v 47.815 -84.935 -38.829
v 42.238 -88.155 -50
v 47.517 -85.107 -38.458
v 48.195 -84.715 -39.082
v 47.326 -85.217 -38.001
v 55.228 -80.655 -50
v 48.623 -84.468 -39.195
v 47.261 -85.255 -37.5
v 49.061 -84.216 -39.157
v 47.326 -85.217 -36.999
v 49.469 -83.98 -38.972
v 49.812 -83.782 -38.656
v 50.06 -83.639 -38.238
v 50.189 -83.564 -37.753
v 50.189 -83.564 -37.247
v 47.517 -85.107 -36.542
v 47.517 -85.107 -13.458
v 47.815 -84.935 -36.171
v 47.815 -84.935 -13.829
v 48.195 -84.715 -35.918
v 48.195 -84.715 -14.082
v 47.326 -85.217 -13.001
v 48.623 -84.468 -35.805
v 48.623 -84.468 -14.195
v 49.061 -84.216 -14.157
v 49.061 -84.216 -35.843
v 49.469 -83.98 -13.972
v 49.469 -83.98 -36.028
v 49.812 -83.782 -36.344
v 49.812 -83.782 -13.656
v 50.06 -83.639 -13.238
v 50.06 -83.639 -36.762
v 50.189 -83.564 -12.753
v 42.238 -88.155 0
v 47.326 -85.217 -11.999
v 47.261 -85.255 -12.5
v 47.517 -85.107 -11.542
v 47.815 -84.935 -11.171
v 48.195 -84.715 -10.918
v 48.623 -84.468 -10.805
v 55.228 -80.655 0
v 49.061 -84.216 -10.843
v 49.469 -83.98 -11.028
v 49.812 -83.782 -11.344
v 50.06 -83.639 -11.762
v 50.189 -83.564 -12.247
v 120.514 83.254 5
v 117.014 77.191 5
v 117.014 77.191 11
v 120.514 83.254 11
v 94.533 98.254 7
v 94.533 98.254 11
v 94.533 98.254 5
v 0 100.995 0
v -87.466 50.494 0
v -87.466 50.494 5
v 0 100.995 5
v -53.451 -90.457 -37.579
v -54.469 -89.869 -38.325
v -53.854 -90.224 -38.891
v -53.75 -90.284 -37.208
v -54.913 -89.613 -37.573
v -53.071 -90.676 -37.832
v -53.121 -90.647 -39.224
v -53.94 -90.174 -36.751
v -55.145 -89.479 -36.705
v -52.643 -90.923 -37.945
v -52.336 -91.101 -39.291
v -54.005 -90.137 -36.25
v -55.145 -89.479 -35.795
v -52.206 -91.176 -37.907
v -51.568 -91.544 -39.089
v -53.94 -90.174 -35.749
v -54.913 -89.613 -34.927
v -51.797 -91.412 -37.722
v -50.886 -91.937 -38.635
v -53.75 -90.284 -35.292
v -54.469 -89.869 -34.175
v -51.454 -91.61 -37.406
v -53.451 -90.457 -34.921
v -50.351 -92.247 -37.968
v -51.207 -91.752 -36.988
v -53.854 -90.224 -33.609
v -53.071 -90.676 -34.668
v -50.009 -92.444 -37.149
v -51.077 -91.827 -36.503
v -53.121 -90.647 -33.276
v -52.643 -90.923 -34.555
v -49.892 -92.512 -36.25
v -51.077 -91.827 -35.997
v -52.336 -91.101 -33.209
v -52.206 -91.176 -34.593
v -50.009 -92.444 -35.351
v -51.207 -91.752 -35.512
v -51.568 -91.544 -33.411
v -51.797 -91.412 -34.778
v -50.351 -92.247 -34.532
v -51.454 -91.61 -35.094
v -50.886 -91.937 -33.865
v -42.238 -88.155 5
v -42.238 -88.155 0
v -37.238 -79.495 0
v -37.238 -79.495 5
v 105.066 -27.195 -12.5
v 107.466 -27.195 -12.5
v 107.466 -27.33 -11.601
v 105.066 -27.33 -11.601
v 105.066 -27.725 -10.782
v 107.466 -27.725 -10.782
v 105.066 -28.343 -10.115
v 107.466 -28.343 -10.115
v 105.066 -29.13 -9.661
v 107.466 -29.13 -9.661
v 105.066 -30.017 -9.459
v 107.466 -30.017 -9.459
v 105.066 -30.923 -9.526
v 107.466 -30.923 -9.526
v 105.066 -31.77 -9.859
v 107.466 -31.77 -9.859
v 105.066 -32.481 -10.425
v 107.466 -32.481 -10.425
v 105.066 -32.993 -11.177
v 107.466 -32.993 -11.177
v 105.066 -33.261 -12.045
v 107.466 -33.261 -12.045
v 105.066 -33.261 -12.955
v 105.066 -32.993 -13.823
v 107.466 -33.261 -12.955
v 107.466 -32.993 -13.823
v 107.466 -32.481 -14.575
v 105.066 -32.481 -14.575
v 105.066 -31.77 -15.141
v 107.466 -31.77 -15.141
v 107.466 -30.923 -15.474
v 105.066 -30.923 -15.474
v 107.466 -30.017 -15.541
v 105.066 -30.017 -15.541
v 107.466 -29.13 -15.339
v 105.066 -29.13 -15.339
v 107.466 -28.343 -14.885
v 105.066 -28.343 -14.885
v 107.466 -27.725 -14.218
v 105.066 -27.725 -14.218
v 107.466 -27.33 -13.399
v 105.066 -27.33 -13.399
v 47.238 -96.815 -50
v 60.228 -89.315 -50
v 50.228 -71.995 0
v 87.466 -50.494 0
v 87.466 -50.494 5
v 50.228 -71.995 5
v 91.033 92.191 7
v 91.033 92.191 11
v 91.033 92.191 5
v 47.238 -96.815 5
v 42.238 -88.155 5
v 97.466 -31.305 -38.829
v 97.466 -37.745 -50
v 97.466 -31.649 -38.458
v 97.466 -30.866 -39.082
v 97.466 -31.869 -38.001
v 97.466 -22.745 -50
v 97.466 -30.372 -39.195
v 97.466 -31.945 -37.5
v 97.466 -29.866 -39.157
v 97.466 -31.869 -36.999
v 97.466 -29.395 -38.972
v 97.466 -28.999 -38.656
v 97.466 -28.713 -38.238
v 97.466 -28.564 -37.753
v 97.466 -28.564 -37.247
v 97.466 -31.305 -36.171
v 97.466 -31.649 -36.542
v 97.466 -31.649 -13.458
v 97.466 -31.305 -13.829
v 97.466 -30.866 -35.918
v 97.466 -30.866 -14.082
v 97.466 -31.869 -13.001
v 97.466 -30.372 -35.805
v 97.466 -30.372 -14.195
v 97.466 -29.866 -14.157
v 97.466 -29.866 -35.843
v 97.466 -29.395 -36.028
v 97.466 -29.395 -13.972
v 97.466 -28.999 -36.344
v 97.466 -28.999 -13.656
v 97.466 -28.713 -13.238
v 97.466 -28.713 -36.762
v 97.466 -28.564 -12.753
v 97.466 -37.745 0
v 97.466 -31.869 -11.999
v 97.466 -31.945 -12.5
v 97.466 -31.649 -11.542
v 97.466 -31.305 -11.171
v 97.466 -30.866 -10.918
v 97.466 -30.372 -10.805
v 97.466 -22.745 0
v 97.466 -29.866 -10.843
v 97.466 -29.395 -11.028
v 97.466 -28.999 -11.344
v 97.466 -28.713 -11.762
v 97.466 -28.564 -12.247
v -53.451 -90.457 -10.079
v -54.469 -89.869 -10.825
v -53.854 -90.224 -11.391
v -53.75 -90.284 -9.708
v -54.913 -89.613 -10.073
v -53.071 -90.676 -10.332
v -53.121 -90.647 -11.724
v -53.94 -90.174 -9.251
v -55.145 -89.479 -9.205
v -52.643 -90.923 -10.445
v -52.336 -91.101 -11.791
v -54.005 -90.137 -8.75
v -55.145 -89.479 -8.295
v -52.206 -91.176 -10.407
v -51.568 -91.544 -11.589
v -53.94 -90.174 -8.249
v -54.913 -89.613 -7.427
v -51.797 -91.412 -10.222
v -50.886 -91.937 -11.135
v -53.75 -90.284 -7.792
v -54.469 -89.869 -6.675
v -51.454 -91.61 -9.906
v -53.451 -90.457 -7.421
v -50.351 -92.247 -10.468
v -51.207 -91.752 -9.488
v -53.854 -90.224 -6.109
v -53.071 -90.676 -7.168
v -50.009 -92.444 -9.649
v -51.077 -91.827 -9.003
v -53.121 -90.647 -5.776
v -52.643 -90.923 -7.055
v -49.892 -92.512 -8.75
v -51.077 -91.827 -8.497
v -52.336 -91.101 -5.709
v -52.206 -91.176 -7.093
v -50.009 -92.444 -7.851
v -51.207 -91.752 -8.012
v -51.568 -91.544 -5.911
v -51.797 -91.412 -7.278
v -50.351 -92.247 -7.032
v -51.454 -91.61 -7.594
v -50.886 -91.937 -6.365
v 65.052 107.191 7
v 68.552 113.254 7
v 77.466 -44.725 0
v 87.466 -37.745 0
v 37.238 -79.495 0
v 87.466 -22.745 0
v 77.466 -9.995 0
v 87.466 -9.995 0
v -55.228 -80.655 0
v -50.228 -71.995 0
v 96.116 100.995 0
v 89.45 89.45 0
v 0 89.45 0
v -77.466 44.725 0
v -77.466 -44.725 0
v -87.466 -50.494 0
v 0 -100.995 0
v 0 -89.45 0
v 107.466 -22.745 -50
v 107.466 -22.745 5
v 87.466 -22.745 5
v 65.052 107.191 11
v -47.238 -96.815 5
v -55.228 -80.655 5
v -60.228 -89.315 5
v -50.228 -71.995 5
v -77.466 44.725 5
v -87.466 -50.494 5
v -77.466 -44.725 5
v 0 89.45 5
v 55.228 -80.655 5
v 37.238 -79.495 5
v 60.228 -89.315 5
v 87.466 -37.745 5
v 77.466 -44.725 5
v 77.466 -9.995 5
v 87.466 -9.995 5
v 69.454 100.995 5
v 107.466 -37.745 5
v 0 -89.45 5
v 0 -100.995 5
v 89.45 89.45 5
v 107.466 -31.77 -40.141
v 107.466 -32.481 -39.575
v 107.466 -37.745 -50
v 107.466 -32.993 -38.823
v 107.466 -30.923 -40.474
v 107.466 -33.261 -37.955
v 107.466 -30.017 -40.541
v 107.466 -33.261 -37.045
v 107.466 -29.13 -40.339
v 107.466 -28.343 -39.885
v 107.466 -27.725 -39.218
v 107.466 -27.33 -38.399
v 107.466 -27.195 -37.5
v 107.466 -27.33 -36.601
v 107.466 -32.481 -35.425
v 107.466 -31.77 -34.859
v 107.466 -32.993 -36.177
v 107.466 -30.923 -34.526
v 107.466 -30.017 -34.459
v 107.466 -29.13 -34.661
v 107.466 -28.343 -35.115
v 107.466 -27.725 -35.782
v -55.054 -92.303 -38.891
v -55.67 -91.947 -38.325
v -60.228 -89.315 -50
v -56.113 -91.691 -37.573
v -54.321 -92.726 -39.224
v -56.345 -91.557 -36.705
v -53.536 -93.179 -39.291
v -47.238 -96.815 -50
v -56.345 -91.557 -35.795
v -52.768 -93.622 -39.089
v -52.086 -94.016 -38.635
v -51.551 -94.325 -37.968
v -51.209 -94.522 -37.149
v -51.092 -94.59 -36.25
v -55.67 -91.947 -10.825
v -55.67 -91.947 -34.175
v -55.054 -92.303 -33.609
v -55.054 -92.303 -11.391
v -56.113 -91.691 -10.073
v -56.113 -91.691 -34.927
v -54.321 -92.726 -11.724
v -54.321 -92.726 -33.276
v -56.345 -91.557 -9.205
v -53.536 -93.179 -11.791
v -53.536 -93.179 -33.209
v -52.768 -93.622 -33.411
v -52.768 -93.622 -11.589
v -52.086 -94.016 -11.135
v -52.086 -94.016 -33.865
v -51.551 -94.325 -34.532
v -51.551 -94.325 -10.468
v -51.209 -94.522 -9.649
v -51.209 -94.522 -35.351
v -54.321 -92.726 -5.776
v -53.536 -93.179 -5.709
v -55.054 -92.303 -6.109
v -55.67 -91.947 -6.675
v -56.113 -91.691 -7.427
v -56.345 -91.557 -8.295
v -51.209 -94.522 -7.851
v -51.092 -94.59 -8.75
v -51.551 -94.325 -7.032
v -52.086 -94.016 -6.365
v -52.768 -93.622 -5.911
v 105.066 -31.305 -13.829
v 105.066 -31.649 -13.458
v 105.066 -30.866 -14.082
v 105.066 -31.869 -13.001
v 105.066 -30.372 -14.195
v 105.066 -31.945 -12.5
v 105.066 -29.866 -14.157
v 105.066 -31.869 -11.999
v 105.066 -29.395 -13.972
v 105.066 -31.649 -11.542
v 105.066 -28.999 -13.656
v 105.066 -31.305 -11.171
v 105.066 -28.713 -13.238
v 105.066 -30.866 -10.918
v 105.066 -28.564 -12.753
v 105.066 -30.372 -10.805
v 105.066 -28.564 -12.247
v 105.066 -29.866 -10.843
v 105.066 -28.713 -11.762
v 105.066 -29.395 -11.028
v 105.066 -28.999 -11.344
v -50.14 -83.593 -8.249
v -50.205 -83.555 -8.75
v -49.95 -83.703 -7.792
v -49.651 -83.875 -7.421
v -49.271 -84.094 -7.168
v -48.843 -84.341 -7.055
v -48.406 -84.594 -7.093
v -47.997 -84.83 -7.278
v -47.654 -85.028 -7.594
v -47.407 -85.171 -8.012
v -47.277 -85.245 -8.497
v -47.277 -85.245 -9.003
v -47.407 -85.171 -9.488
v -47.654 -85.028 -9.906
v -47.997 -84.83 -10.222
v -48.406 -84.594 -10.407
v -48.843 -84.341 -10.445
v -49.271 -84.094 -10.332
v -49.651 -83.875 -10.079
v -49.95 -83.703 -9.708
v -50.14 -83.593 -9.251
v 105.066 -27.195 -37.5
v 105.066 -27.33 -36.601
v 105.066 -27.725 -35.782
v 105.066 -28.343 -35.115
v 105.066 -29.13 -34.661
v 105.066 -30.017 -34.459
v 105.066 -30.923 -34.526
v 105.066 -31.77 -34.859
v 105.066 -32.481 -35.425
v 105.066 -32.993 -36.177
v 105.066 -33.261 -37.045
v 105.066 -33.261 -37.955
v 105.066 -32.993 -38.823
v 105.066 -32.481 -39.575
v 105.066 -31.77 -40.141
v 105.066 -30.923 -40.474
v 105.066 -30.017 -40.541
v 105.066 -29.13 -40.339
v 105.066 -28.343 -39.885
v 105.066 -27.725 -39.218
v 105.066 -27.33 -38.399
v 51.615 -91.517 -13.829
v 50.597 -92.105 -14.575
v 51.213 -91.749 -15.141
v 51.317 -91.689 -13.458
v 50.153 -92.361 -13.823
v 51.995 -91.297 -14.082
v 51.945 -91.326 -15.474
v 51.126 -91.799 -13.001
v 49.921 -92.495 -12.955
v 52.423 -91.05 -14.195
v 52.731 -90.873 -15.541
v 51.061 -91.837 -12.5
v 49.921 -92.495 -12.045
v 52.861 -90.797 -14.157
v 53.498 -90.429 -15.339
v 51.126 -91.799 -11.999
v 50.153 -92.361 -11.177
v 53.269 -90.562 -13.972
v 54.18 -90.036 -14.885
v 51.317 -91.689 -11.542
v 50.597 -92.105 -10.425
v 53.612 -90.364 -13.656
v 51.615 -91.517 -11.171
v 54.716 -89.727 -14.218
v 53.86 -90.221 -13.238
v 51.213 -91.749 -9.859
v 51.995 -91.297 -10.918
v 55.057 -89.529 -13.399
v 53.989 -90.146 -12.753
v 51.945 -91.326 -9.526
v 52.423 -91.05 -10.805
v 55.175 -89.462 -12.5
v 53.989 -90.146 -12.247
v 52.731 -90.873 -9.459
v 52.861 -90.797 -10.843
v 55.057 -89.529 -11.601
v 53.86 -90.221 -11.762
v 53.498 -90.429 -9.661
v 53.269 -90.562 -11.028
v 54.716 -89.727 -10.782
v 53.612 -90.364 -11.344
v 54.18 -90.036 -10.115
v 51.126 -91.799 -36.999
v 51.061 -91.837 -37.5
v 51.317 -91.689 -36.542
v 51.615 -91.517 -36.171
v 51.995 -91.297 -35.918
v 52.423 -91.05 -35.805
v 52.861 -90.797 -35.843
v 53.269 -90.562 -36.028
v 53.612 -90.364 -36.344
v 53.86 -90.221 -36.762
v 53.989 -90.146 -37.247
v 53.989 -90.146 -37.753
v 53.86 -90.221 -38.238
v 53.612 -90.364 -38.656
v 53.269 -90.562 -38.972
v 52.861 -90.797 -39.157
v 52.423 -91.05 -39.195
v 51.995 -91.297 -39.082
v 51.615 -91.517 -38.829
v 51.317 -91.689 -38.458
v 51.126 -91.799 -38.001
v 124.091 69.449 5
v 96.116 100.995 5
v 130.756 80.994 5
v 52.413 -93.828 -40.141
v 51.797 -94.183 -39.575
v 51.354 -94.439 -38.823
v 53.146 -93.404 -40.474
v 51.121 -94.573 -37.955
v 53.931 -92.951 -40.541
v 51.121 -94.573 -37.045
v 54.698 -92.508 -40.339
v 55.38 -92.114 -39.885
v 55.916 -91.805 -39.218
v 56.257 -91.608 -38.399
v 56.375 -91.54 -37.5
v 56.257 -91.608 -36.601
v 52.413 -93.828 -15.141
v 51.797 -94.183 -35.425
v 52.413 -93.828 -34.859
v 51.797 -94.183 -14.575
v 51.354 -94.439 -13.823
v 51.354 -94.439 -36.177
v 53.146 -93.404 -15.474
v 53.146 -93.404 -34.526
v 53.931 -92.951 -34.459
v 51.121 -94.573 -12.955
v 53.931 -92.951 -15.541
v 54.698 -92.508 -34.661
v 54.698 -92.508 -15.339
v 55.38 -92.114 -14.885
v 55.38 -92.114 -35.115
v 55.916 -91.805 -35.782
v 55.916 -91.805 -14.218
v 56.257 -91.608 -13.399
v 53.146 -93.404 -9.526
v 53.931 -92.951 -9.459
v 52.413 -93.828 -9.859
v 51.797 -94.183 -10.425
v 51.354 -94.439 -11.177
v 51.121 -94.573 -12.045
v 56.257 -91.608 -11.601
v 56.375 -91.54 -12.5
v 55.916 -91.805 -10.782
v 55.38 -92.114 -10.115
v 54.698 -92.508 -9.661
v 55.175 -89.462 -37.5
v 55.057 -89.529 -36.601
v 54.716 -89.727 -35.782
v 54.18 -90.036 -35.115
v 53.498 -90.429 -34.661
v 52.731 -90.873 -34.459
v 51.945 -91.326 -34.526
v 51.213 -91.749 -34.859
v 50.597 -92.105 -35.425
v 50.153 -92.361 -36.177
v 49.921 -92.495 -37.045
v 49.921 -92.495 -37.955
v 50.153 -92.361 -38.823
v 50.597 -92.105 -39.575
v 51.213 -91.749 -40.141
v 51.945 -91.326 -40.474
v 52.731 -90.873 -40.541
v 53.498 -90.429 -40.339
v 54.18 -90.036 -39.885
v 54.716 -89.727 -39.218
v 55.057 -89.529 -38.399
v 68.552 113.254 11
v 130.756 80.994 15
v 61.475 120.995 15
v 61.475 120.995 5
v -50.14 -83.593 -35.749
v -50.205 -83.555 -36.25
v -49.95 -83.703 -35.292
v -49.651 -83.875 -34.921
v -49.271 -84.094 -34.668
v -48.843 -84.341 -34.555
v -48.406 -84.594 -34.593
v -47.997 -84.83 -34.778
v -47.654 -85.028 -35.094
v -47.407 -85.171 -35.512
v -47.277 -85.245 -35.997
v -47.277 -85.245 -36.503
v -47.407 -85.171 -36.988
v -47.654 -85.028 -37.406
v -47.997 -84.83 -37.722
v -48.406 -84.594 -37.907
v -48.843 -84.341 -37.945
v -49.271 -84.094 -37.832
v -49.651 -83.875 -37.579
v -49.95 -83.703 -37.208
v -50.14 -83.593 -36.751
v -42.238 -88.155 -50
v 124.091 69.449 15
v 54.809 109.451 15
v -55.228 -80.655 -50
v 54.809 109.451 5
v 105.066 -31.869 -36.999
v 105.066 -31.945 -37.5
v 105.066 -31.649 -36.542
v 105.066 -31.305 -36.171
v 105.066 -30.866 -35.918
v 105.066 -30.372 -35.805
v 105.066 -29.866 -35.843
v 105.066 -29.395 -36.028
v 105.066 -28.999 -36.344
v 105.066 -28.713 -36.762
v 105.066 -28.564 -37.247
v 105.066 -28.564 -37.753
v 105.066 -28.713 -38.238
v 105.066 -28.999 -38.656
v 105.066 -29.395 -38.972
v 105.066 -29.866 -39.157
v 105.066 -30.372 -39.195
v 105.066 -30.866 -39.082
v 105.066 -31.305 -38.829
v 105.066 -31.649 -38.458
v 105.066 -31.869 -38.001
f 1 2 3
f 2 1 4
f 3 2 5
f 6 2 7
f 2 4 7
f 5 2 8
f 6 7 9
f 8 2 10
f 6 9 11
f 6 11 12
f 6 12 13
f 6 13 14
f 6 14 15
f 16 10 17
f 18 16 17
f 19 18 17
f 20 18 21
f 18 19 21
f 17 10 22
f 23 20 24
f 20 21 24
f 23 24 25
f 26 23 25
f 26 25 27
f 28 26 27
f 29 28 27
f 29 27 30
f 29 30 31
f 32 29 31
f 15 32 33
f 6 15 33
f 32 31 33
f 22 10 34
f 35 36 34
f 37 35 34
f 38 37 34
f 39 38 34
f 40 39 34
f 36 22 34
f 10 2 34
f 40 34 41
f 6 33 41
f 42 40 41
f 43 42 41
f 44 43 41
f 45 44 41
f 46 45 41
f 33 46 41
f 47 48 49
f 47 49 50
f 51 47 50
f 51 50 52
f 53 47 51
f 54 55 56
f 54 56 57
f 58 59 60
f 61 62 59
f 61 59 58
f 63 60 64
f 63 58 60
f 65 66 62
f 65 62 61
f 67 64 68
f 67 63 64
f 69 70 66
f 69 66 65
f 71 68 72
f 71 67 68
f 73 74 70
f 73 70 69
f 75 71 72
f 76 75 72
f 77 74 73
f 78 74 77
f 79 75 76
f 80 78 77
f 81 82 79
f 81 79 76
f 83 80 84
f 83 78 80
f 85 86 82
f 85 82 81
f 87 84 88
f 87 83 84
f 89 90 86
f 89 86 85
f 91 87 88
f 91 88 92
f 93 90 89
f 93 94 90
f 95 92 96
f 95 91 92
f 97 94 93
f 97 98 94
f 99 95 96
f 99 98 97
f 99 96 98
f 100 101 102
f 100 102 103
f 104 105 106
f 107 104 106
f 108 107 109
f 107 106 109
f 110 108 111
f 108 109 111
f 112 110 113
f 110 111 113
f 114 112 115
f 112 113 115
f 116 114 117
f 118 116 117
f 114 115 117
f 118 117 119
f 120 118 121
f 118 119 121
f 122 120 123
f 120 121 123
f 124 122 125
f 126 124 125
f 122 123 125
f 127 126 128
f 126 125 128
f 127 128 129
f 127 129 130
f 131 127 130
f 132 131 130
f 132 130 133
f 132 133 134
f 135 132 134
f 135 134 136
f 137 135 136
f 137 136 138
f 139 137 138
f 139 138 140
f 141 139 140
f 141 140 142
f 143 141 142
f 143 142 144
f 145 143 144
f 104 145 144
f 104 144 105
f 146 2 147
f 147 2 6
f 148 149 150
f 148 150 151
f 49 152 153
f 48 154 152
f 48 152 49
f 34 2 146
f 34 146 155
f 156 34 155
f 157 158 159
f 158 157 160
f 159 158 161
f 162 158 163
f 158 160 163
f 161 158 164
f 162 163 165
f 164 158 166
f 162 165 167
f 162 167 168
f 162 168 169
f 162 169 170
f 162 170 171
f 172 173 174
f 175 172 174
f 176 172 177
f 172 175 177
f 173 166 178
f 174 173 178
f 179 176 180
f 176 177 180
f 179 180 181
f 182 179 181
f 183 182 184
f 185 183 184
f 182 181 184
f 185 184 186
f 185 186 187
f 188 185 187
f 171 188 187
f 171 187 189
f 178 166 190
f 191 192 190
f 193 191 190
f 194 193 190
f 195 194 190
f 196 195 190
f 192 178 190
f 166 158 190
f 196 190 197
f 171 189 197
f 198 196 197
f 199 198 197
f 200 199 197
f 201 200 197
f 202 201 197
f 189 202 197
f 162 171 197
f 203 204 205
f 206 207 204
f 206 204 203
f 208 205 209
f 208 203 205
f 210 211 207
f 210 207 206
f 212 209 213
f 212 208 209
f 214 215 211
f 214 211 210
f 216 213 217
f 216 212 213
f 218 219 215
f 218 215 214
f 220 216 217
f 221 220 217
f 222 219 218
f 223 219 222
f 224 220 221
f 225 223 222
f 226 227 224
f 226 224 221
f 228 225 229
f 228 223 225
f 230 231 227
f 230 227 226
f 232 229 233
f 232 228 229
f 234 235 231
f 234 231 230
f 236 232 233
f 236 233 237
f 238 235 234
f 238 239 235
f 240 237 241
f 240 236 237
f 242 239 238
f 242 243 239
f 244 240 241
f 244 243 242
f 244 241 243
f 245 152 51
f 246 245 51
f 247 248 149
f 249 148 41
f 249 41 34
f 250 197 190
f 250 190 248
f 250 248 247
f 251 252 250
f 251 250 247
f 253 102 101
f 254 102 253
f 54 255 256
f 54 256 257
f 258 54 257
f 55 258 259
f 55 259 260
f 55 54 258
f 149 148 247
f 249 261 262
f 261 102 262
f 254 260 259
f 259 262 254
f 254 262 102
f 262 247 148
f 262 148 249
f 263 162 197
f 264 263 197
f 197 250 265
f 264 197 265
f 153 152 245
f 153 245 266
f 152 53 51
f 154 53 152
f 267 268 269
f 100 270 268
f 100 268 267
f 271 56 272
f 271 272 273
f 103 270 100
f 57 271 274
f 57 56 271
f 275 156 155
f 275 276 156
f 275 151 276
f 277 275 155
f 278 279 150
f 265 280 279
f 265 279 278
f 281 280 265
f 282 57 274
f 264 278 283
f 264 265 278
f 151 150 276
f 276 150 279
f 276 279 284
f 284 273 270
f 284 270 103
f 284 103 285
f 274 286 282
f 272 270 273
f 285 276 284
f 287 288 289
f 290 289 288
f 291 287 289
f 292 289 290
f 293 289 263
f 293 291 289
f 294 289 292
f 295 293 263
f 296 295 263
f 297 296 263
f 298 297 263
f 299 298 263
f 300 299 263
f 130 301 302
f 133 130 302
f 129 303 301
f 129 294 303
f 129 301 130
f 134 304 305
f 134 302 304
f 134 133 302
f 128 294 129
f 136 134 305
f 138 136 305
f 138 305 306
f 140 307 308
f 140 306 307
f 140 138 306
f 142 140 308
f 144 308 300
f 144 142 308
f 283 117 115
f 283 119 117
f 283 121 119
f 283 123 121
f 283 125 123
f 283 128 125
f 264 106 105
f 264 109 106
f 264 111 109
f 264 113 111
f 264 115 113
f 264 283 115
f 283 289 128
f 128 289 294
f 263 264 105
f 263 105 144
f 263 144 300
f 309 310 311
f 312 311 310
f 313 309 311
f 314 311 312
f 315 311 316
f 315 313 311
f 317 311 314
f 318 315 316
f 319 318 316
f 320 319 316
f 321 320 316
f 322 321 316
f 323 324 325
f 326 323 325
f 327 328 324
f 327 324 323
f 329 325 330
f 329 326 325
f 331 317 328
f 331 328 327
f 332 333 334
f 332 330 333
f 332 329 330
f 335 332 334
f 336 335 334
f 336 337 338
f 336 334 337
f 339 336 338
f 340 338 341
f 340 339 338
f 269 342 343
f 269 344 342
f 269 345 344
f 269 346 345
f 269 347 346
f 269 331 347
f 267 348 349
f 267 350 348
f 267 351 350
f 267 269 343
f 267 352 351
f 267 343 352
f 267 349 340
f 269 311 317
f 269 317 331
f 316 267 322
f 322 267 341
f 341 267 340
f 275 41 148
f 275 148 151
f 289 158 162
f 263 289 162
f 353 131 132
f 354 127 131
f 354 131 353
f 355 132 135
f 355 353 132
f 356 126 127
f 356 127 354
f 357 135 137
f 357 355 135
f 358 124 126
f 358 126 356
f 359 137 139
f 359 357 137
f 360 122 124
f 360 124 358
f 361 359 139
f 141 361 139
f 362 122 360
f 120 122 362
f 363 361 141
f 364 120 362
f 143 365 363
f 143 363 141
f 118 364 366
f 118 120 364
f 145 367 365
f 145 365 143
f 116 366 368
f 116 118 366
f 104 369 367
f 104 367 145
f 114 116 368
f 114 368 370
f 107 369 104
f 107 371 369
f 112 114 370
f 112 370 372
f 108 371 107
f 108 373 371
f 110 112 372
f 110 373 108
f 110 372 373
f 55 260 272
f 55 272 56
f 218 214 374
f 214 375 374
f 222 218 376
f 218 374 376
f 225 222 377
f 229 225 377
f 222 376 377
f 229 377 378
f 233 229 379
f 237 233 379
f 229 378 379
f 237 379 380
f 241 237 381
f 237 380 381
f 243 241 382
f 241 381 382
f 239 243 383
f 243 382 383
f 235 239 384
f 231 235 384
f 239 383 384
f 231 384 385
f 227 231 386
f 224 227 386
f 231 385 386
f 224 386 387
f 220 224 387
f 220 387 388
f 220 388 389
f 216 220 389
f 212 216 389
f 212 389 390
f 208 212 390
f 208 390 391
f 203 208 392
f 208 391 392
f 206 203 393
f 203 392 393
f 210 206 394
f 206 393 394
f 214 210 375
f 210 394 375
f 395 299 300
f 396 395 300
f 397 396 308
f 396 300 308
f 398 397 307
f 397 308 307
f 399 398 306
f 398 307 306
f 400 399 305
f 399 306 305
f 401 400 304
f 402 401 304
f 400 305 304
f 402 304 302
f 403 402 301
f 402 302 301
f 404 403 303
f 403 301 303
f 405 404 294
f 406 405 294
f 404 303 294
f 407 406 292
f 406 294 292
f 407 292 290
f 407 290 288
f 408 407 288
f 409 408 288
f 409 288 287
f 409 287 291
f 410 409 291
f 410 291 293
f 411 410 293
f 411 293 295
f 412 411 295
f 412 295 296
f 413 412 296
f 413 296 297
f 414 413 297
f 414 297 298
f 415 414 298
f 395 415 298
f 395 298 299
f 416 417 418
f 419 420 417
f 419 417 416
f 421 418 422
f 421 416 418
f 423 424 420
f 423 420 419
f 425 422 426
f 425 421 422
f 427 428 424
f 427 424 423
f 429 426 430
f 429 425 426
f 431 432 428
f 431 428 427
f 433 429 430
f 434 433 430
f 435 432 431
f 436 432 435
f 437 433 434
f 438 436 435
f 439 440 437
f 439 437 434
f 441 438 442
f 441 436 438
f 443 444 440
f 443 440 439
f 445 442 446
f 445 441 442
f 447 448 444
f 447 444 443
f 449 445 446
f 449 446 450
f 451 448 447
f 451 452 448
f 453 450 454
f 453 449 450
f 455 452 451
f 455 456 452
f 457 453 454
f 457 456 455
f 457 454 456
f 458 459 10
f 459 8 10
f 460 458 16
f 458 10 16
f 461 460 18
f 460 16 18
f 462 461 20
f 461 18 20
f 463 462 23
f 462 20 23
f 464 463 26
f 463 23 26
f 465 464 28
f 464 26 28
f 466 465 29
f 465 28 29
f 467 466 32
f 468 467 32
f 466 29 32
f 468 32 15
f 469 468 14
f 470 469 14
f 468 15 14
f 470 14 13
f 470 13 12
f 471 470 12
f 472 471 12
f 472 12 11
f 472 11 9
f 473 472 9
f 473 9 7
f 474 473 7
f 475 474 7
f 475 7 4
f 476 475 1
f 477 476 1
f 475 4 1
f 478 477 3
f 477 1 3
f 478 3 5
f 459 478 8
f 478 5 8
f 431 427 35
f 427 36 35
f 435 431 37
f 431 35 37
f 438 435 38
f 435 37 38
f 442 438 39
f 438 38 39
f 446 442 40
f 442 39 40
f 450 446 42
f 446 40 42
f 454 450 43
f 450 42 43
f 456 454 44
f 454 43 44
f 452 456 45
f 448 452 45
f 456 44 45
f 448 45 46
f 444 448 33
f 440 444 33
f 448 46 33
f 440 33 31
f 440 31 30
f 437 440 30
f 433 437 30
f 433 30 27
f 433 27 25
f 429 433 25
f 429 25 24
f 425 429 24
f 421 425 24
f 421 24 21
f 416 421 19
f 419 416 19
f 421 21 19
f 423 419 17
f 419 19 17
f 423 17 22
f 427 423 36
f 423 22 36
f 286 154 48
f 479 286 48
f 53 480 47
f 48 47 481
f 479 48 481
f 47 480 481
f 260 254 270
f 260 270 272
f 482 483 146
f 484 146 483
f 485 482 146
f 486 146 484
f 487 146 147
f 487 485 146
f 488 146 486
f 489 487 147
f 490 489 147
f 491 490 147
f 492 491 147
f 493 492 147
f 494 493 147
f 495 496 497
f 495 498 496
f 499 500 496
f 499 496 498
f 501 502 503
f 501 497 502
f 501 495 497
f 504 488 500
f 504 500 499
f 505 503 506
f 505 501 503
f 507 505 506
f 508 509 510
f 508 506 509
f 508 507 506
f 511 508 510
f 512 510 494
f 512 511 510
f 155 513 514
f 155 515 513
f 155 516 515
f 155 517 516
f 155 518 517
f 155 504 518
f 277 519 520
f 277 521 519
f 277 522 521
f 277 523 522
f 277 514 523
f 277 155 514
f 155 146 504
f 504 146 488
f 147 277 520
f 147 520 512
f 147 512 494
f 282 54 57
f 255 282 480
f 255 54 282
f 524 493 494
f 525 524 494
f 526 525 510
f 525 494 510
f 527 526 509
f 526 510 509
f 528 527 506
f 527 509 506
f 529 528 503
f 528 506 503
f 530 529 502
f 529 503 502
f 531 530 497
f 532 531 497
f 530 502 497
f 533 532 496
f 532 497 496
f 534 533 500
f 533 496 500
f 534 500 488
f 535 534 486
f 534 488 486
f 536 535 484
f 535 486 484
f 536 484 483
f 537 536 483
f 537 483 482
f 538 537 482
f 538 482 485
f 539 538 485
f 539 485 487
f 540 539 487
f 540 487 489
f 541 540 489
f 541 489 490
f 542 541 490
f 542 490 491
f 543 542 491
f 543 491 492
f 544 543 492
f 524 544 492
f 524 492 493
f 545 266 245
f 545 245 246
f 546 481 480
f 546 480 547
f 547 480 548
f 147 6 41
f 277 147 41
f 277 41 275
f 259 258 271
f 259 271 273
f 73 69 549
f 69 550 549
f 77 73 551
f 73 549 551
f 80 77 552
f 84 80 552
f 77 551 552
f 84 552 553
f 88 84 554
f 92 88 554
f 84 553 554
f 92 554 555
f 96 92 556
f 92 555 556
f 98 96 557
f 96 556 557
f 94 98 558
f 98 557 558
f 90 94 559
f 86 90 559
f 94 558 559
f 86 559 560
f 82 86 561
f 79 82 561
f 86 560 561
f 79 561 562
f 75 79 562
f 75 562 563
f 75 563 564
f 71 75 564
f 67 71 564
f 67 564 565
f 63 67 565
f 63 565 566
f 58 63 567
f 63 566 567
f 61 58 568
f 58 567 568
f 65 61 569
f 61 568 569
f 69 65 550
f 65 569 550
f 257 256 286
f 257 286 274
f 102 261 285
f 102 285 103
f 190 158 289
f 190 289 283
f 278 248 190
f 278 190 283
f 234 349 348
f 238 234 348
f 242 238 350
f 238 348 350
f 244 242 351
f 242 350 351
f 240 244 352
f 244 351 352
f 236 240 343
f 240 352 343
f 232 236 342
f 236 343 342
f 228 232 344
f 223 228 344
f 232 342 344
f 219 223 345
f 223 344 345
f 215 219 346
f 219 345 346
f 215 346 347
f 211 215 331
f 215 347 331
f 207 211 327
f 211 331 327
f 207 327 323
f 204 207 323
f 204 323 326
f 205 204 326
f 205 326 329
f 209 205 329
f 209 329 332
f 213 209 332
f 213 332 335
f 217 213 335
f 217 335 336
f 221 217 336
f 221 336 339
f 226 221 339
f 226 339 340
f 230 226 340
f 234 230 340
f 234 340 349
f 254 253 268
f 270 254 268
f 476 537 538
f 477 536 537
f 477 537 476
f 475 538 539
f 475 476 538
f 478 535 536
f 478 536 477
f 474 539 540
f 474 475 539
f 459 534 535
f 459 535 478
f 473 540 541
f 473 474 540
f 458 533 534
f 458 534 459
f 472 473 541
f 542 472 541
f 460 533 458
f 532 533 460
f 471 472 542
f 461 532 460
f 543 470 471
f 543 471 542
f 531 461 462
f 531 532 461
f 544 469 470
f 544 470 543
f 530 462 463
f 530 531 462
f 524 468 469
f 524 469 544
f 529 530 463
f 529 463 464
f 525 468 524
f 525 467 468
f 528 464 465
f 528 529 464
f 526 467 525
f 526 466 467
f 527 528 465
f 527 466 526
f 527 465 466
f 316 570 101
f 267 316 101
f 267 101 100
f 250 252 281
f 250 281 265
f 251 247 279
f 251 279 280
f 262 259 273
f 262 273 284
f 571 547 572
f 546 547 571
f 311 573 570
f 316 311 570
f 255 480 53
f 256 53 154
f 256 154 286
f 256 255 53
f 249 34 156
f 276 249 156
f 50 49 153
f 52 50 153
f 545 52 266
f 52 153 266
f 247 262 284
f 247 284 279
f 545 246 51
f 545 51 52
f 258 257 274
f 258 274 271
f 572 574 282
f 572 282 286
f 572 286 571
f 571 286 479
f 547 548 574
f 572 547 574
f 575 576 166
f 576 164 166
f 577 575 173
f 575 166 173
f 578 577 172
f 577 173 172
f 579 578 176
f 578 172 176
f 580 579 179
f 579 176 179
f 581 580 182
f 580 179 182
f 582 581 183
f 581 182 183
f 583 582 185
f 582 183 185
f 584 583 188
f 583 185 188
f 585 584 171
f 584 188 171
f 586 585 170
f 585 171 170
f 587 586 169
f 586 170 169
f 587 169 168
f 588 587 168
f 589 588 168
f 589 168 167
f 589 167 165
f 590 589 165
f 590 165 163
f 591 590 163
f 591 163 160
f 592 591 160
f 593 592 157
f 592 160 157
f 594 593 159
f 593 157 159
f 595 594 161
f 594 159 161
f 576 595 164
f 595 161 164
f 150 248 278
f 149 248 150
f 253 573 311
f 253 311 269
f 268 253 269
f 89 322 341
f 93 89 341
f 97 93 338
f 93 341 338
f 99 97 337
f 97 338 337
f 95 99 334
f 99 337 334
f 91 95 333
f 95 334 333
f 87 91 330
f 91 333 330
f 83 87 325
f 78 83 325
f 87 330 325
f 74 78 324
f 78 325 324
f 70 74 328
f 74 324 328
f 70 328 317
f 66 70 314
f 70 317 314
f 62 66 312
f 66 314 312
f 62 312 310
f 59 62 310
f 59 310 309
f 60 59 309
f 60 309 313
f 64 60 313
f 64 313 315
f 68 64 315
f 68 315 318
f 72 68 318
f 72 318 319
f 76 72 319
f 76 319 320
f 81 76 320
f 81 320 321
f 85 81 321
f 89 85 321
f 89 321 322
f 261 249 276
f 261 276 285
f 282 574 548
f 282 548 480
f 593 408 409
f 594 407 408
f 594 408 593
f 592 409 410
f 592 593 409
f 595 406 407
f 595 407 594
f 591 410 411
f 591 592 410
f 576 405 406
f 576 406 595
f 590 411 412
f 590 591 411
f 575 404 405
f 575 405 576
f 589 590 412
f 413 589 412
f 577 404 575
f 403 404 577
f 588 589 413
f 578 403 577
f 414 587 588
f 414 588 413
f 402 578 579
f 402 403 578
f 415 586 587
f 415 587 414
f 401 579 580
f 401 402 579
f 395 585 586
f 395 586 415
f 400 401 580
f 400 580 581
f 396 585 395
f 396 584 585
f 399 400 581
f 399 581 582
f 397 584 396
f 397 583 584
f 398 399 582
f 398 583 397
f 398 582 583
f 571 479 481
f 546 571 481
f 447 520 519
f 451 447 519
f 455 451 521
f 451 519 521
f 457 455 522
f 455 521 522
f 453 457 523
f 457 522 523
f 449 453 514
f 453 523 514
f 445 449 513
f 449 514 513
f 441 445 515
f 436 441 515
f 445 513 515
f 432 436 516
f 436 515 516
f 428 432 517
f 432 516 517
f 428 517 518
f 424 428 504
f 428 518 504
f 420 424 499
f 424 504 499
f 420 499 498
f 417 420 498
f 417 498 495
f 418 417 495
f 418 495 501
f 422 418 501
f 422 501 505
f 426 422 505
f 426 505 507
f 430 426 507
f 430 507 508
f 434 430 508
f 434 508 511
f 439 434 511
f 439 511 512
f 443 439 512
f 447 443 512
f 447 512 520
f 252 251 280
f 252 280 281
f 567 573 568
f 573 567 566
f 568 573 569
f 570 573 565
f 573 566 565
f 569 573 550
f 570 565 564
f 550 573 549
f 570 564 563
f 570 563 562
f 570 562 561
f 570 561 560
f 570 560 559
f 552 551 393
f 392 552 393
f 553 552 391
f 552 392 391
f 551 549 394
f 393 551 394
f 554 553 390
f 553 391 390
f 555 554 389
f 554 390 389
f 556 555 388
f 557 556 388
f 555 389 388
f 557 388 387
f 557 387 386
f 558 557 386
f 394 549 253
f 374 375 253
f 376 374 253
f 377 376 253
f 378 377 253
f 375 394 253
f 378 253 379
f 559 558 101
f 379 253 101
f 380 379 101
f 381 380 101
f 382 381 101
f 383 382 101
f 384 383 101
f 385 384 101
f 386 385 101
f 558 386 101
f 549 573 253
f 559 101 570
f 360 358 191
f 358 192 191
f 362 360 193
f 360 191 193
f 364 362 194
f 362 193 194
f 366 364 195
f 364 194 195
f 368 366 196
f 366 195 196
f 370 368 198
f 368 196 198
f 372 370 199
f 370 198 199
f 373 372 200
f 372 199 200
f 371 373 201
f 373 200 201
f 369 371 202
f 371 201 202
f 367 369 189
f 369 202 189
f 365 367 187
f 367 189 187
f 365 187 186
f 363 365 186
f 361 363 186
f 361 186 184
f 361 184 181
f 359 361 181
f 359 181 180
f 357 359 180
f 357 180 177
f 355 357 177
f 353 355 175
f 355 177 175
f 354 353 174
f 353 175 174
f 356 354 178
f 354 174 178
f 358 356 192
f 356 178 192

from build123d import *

# Parameters (mm, degrees)
PAD_DEPTH           = 5
PAD001_DEPTH        = 10
POCKET_DEPTH        = 6
SKETCH003_W         = 7
SKETCH003_H         = 4
POCKET001_DEPTH     = 30
SKETCH004_W         = 15
SKETCH004_H         = 5
PAD002_DEPTH        = 10
SKETCH005_W         = 15
SKETCH005_H         = 55
PAD003_DEPTH        = 10
HOLE_D              = 3.4
HOLE_DEPTH          = 25
HOLE_CBORE_D        = 6.1
HOLE_CBORE_DEPTH    = 2.4
HOLE_TIPS_R         = 1.7
SKETCH007_W         = 15
SKETCH007_H         = 5
PAD004_DEPTH        = 10
SKETCH008_W         = 15
SKETCH008_H         = 55
PAD005_DEPTH        = 10
HOLE001_D           = 3.4
HOLE001_DEPTH       = 25
HOLE001_CBORE_D     = 6.1
HOLE001_CBORE_DEPTH = 2.4
HOLE001_TIPS_R      = 1.7
SKETCH010_W         = 15
SKETCH010_H         = 5
PAD006_DEPTH        = 10
SKETCH011_W         = 15
SKETCH011_H         = 55
PAD007_DEPTH        = 10
HOLE002_D           = 3.4
HOLE002_DEPTH       = 25
HOLE002_CBORE_D     = 6.1
HOLE002_CBORE_DEPTH = 2.4
HOLE002_TIPS_R      = 1.7


with BuildPart() as part:
    # Sketch → Pad (new body)
    with BuildSketch(Plane.XY):
        Polygon((77.465972, -44.725), (77.465972, -9.995), (87.465972, -9.995), (87.465972, -50.494492), (0, -100.995), (-87.465972, -50.494492), (-87.465972, 50.494492), (0, 100.995), (96.115509, 100.995), (89.45, 89.45), (0, 89.45), (-77.465972, 44.725), (-77.465972, -44.725), (0, -89.45), align=None)
    extrude(amount=PAD_DEPTH)

    # Sketch001 (on Face16 of Pad) → Pad001 (join)
    with BuildSketch(Plane.XY.offset(5)):
        Polygon((124.090672, 69.449404), (130.75638, 80.99429), (61.475035, 120.995481), (54.809328, 109.450596), align=None)
    extrude(amount=PAD001_DEPTH)

    # Sketch002 (on Face7 of Pad001) → Pocket (cut)
    with BuildSketch(Plane(origin=(0, 0, 5), x_dir=(1, 0, 0), z_dir=(0, 0, -1))):
        Polygon((91.032754, -92.191411), (117.013517, -77.191411), (120.513517, -83.253589), (94.532754, -98.253589), align=None)
    extrude(amount=-POCKET_DEPTH, mode=Mode.SUBTRACT)

    # Sketch003 (on Face8 of Pocket) → Pocket001 (cut)
    with BuildSketch(Plane(origin=(28.354514, -16.370486, 0), x_dir=(0.5, 0.866025, 0), z_dir=(0.866025, -0.5, 0))):
        with Locations((128.856481, 9)):
            Rectangle(SKETCH003_W, SKETCH003_H)
    extrude(amount=-POCKET001_DEPTH, mode=Mode.SUBTRACT)

    # Sketch004 (on Face14 of Pocket001) → Pad002 (join)
    with BuildSketch(Plane.YZ.offset(87.465972)):
        with Locations((-30.244746, 2.5)):
            Rectangle(SKETCH004_W, SKETCH004_H)
    extrude(amount=PAD002_DEPTH)

    # Sketch005 (on Face32 of Pad002) → Pad003 (join)
    with BuildSketch(Plane.YZ.offset(97.465972)):
        with Locations((-30.244746, -22.5)):
            Rectangle(SKETCH005_W, SKETCH005_H)
    extrude(amount=PAD003_DEPTH)

    # Hole
    with Locations(Plane.YZ.offset(107.465972)):
        with Locations((-30.244746, -12.5), (-30.244746, -37.5)):
            CounterBoreHole(HOLE_D / 2, HOLE_CBORE_D / 2, HOLE_CBORE_DEPTH, depth=HOLE_DEPTH)

    # Hole tips → Hole tip 1 section 0
    with BuildSketch(Plane.YZ.offset(82.465972), mode=Mode.PRIVATE) as hole_tip_1_s0:
        with Locations((-30.244746, -12.5)):
            Circle(HOLE_TIPS_R)
    loft([hole_tip_1_s0.sketch, Vertex(81.444509, -30.244746, -12.5)], mode=Mode.SUBTRACT)

    # Hole tips → Hole tip 2 section 0
    with BuildSketch(Plane.YZ.offset(82.465972), mode=Mode.PRIVATE) as hole_tip_2_s0:
        with Locations((-30.244746, -37.5)):
            Circle(HOLE_TIPS_R)
    loft([hole_tip_2_s0.sketch, Vertex(81.444509, -30.244746, -37.5)], mode=Mode.SUBTRACT)

    # Sketch007 (on Face17 of Hole) → Pad004 (join)
    with BuildSketch(Plane(origin=(43.732986, -75.744746, 0), x_dir=(0.866017, 0.500015, 0), z_dir=(0.500015, -0.866017, 0))):
        with Locations((0, 2.5)):
            Rectangle(SKETCH007_W, SKETCH007_H)
    extrude(amount=PAD004_DEPTH)

    # Sketch008 (on Face38 of Pad004) → Pad005 (join)
    with BuildSketch(Plane(origin=(48.733135, -84.404914, 0), x_dir=(0.866017, 0.500015, 0), z_dir=(0.500015, -0.866017, 0))):
        with Locations((0, -22.5)):
            Rectangle(SKETCH008_W, SKETCH008_H)
    extrude(amount=PAD005_DEPTH)

    # Hole001
    with Locations(Plane(origin=(53.733284, -93.065082, 0), x_dir=(0.866017, 0.500015, 0), z_dir=(0.500015, -0.866017, 0))):
        with Locations((0, -12.5), (0, -37.5)):
            CounterBoreHole(HOLE001_D / 2, HOLE001_CBORE_D / 2, HOLE001_CBORE_DEPTH, depth=HOLE001_DEPTH)

    # Hole001 tips → Hole001 tip 1 section 0
    with BuildSketch(Plane(origin=(41.232912, -71.414662, 0), x_dir=(0.866017, 0.500015, 0), z_dir=(0.500015, -0.866017, 0)), mode=Mode.PRIVATE) as hole001_tip_1_s0:
        with Locations((0, -12.5)):
            Circle(HOLE001_TIPS_R)
    loft([hole001_tip_1_s0.sketch, Vertex(40.722165, -70.530058, -12.5)], mode=Mode.SUBTRACT)

    # Hole001 tips → Hole001 tip 2 section 0
    with BuildSketch(Plane(origin=(41.232912, -71.414662, 0), x_dir=(0.866017, 0.500015, 0), z_dir=(0.500015, -0.866017, 0)), mode=Mode.PRIVATE) as hole001_tip_2_s0:
        with Locations((0, -37.5)):
            Circle(HOLE001_TIPS_R)
    loft([hole001_tip_2_s0.sketch, Vertex(40.722165, -70.530058, -37.5)], mode=Mode.SUBTRACT)

    # Sketch010 (on Face20 of Hole001) → Pad006 (join)
    with BuildSketch(Plane(origin=(-43.732986, -75.744746, 0), x_dir=(0.866017, -0.500015, 0), z_dir=(-0.500015, -0.866017, 0))):
        with Locations((0, 2.5)):
            Rectangle(SKETCH010_W, SKETCH010_H)
    extrude(amount=PAD006_DEPTH)

    # Sketch011 (on Face44 of Pad006) → Pad007 (join)
    with BuildSketch(Plane(origin=(-48.733135, -84.404914, 0), x_dir=(0.866017, -0.500015, 0), z_dir=(-0.500015, -0.866017, 0))):
        with Locations((0, -22.5)):
            Rectangle(SKETCH011_W, SKETCH011_H)
    extrude(amount=PAD007_DEPTH)

    # Hole002
    with Locations(Plane(origin=(-53.733284, -93.065082, 0), x_dir=(0.866017, -0.500015, 0), z_dir=(-0.500015, -0.866017, 0))):
        with Locations((0, -36.25), (0, -8.75)):
            CounterBoreHole(HOLE002_D / 2, HOLE002_CBORE_D / 2, HOLE002_CBORE_DEPTH, depth=HOLE002_DEPTH)

    # Hole002 tips → Hole002 tip 1 section 0
    with BuildSketch(Plane(origin=(-41.232912, -71.414662, 0), x_dir=(0.866017, -0.500015, 0), z_dir=(-0.500015, -0.866017, 0)), mode=Mode.PRIVATE) as hole002_tip_1_s0:
        with Locations((0, -36.25)):
            Circle(HOLE002_TIPS_R)
    loft([hole002_tip_1_s0.sketch, Vertex(-40.722165, -70.530058, -36.25)], mode=Mode.SUBTRACT)

    # Hole002 tips → Hole002 tip 2 section 0
    with BuildSketch(Plane(origin=(-41.232912, -71.414662, 0), x_dir=(0.866017, -0.500015, 0), z_dir=(-0.500015, -0.866017, 0)), mode=Mode.PRIVATE) as hole002_tip_2_s0:
        with Locations((0, -8.75)):
            Circle(HOLE002_TIPS_R)
    loft([hole002_tip_2_s0.sketch, Vertex(-40.722165, -70.530058, -8.75)], mode=Mode.SUBTRACT)


solid = part.part
